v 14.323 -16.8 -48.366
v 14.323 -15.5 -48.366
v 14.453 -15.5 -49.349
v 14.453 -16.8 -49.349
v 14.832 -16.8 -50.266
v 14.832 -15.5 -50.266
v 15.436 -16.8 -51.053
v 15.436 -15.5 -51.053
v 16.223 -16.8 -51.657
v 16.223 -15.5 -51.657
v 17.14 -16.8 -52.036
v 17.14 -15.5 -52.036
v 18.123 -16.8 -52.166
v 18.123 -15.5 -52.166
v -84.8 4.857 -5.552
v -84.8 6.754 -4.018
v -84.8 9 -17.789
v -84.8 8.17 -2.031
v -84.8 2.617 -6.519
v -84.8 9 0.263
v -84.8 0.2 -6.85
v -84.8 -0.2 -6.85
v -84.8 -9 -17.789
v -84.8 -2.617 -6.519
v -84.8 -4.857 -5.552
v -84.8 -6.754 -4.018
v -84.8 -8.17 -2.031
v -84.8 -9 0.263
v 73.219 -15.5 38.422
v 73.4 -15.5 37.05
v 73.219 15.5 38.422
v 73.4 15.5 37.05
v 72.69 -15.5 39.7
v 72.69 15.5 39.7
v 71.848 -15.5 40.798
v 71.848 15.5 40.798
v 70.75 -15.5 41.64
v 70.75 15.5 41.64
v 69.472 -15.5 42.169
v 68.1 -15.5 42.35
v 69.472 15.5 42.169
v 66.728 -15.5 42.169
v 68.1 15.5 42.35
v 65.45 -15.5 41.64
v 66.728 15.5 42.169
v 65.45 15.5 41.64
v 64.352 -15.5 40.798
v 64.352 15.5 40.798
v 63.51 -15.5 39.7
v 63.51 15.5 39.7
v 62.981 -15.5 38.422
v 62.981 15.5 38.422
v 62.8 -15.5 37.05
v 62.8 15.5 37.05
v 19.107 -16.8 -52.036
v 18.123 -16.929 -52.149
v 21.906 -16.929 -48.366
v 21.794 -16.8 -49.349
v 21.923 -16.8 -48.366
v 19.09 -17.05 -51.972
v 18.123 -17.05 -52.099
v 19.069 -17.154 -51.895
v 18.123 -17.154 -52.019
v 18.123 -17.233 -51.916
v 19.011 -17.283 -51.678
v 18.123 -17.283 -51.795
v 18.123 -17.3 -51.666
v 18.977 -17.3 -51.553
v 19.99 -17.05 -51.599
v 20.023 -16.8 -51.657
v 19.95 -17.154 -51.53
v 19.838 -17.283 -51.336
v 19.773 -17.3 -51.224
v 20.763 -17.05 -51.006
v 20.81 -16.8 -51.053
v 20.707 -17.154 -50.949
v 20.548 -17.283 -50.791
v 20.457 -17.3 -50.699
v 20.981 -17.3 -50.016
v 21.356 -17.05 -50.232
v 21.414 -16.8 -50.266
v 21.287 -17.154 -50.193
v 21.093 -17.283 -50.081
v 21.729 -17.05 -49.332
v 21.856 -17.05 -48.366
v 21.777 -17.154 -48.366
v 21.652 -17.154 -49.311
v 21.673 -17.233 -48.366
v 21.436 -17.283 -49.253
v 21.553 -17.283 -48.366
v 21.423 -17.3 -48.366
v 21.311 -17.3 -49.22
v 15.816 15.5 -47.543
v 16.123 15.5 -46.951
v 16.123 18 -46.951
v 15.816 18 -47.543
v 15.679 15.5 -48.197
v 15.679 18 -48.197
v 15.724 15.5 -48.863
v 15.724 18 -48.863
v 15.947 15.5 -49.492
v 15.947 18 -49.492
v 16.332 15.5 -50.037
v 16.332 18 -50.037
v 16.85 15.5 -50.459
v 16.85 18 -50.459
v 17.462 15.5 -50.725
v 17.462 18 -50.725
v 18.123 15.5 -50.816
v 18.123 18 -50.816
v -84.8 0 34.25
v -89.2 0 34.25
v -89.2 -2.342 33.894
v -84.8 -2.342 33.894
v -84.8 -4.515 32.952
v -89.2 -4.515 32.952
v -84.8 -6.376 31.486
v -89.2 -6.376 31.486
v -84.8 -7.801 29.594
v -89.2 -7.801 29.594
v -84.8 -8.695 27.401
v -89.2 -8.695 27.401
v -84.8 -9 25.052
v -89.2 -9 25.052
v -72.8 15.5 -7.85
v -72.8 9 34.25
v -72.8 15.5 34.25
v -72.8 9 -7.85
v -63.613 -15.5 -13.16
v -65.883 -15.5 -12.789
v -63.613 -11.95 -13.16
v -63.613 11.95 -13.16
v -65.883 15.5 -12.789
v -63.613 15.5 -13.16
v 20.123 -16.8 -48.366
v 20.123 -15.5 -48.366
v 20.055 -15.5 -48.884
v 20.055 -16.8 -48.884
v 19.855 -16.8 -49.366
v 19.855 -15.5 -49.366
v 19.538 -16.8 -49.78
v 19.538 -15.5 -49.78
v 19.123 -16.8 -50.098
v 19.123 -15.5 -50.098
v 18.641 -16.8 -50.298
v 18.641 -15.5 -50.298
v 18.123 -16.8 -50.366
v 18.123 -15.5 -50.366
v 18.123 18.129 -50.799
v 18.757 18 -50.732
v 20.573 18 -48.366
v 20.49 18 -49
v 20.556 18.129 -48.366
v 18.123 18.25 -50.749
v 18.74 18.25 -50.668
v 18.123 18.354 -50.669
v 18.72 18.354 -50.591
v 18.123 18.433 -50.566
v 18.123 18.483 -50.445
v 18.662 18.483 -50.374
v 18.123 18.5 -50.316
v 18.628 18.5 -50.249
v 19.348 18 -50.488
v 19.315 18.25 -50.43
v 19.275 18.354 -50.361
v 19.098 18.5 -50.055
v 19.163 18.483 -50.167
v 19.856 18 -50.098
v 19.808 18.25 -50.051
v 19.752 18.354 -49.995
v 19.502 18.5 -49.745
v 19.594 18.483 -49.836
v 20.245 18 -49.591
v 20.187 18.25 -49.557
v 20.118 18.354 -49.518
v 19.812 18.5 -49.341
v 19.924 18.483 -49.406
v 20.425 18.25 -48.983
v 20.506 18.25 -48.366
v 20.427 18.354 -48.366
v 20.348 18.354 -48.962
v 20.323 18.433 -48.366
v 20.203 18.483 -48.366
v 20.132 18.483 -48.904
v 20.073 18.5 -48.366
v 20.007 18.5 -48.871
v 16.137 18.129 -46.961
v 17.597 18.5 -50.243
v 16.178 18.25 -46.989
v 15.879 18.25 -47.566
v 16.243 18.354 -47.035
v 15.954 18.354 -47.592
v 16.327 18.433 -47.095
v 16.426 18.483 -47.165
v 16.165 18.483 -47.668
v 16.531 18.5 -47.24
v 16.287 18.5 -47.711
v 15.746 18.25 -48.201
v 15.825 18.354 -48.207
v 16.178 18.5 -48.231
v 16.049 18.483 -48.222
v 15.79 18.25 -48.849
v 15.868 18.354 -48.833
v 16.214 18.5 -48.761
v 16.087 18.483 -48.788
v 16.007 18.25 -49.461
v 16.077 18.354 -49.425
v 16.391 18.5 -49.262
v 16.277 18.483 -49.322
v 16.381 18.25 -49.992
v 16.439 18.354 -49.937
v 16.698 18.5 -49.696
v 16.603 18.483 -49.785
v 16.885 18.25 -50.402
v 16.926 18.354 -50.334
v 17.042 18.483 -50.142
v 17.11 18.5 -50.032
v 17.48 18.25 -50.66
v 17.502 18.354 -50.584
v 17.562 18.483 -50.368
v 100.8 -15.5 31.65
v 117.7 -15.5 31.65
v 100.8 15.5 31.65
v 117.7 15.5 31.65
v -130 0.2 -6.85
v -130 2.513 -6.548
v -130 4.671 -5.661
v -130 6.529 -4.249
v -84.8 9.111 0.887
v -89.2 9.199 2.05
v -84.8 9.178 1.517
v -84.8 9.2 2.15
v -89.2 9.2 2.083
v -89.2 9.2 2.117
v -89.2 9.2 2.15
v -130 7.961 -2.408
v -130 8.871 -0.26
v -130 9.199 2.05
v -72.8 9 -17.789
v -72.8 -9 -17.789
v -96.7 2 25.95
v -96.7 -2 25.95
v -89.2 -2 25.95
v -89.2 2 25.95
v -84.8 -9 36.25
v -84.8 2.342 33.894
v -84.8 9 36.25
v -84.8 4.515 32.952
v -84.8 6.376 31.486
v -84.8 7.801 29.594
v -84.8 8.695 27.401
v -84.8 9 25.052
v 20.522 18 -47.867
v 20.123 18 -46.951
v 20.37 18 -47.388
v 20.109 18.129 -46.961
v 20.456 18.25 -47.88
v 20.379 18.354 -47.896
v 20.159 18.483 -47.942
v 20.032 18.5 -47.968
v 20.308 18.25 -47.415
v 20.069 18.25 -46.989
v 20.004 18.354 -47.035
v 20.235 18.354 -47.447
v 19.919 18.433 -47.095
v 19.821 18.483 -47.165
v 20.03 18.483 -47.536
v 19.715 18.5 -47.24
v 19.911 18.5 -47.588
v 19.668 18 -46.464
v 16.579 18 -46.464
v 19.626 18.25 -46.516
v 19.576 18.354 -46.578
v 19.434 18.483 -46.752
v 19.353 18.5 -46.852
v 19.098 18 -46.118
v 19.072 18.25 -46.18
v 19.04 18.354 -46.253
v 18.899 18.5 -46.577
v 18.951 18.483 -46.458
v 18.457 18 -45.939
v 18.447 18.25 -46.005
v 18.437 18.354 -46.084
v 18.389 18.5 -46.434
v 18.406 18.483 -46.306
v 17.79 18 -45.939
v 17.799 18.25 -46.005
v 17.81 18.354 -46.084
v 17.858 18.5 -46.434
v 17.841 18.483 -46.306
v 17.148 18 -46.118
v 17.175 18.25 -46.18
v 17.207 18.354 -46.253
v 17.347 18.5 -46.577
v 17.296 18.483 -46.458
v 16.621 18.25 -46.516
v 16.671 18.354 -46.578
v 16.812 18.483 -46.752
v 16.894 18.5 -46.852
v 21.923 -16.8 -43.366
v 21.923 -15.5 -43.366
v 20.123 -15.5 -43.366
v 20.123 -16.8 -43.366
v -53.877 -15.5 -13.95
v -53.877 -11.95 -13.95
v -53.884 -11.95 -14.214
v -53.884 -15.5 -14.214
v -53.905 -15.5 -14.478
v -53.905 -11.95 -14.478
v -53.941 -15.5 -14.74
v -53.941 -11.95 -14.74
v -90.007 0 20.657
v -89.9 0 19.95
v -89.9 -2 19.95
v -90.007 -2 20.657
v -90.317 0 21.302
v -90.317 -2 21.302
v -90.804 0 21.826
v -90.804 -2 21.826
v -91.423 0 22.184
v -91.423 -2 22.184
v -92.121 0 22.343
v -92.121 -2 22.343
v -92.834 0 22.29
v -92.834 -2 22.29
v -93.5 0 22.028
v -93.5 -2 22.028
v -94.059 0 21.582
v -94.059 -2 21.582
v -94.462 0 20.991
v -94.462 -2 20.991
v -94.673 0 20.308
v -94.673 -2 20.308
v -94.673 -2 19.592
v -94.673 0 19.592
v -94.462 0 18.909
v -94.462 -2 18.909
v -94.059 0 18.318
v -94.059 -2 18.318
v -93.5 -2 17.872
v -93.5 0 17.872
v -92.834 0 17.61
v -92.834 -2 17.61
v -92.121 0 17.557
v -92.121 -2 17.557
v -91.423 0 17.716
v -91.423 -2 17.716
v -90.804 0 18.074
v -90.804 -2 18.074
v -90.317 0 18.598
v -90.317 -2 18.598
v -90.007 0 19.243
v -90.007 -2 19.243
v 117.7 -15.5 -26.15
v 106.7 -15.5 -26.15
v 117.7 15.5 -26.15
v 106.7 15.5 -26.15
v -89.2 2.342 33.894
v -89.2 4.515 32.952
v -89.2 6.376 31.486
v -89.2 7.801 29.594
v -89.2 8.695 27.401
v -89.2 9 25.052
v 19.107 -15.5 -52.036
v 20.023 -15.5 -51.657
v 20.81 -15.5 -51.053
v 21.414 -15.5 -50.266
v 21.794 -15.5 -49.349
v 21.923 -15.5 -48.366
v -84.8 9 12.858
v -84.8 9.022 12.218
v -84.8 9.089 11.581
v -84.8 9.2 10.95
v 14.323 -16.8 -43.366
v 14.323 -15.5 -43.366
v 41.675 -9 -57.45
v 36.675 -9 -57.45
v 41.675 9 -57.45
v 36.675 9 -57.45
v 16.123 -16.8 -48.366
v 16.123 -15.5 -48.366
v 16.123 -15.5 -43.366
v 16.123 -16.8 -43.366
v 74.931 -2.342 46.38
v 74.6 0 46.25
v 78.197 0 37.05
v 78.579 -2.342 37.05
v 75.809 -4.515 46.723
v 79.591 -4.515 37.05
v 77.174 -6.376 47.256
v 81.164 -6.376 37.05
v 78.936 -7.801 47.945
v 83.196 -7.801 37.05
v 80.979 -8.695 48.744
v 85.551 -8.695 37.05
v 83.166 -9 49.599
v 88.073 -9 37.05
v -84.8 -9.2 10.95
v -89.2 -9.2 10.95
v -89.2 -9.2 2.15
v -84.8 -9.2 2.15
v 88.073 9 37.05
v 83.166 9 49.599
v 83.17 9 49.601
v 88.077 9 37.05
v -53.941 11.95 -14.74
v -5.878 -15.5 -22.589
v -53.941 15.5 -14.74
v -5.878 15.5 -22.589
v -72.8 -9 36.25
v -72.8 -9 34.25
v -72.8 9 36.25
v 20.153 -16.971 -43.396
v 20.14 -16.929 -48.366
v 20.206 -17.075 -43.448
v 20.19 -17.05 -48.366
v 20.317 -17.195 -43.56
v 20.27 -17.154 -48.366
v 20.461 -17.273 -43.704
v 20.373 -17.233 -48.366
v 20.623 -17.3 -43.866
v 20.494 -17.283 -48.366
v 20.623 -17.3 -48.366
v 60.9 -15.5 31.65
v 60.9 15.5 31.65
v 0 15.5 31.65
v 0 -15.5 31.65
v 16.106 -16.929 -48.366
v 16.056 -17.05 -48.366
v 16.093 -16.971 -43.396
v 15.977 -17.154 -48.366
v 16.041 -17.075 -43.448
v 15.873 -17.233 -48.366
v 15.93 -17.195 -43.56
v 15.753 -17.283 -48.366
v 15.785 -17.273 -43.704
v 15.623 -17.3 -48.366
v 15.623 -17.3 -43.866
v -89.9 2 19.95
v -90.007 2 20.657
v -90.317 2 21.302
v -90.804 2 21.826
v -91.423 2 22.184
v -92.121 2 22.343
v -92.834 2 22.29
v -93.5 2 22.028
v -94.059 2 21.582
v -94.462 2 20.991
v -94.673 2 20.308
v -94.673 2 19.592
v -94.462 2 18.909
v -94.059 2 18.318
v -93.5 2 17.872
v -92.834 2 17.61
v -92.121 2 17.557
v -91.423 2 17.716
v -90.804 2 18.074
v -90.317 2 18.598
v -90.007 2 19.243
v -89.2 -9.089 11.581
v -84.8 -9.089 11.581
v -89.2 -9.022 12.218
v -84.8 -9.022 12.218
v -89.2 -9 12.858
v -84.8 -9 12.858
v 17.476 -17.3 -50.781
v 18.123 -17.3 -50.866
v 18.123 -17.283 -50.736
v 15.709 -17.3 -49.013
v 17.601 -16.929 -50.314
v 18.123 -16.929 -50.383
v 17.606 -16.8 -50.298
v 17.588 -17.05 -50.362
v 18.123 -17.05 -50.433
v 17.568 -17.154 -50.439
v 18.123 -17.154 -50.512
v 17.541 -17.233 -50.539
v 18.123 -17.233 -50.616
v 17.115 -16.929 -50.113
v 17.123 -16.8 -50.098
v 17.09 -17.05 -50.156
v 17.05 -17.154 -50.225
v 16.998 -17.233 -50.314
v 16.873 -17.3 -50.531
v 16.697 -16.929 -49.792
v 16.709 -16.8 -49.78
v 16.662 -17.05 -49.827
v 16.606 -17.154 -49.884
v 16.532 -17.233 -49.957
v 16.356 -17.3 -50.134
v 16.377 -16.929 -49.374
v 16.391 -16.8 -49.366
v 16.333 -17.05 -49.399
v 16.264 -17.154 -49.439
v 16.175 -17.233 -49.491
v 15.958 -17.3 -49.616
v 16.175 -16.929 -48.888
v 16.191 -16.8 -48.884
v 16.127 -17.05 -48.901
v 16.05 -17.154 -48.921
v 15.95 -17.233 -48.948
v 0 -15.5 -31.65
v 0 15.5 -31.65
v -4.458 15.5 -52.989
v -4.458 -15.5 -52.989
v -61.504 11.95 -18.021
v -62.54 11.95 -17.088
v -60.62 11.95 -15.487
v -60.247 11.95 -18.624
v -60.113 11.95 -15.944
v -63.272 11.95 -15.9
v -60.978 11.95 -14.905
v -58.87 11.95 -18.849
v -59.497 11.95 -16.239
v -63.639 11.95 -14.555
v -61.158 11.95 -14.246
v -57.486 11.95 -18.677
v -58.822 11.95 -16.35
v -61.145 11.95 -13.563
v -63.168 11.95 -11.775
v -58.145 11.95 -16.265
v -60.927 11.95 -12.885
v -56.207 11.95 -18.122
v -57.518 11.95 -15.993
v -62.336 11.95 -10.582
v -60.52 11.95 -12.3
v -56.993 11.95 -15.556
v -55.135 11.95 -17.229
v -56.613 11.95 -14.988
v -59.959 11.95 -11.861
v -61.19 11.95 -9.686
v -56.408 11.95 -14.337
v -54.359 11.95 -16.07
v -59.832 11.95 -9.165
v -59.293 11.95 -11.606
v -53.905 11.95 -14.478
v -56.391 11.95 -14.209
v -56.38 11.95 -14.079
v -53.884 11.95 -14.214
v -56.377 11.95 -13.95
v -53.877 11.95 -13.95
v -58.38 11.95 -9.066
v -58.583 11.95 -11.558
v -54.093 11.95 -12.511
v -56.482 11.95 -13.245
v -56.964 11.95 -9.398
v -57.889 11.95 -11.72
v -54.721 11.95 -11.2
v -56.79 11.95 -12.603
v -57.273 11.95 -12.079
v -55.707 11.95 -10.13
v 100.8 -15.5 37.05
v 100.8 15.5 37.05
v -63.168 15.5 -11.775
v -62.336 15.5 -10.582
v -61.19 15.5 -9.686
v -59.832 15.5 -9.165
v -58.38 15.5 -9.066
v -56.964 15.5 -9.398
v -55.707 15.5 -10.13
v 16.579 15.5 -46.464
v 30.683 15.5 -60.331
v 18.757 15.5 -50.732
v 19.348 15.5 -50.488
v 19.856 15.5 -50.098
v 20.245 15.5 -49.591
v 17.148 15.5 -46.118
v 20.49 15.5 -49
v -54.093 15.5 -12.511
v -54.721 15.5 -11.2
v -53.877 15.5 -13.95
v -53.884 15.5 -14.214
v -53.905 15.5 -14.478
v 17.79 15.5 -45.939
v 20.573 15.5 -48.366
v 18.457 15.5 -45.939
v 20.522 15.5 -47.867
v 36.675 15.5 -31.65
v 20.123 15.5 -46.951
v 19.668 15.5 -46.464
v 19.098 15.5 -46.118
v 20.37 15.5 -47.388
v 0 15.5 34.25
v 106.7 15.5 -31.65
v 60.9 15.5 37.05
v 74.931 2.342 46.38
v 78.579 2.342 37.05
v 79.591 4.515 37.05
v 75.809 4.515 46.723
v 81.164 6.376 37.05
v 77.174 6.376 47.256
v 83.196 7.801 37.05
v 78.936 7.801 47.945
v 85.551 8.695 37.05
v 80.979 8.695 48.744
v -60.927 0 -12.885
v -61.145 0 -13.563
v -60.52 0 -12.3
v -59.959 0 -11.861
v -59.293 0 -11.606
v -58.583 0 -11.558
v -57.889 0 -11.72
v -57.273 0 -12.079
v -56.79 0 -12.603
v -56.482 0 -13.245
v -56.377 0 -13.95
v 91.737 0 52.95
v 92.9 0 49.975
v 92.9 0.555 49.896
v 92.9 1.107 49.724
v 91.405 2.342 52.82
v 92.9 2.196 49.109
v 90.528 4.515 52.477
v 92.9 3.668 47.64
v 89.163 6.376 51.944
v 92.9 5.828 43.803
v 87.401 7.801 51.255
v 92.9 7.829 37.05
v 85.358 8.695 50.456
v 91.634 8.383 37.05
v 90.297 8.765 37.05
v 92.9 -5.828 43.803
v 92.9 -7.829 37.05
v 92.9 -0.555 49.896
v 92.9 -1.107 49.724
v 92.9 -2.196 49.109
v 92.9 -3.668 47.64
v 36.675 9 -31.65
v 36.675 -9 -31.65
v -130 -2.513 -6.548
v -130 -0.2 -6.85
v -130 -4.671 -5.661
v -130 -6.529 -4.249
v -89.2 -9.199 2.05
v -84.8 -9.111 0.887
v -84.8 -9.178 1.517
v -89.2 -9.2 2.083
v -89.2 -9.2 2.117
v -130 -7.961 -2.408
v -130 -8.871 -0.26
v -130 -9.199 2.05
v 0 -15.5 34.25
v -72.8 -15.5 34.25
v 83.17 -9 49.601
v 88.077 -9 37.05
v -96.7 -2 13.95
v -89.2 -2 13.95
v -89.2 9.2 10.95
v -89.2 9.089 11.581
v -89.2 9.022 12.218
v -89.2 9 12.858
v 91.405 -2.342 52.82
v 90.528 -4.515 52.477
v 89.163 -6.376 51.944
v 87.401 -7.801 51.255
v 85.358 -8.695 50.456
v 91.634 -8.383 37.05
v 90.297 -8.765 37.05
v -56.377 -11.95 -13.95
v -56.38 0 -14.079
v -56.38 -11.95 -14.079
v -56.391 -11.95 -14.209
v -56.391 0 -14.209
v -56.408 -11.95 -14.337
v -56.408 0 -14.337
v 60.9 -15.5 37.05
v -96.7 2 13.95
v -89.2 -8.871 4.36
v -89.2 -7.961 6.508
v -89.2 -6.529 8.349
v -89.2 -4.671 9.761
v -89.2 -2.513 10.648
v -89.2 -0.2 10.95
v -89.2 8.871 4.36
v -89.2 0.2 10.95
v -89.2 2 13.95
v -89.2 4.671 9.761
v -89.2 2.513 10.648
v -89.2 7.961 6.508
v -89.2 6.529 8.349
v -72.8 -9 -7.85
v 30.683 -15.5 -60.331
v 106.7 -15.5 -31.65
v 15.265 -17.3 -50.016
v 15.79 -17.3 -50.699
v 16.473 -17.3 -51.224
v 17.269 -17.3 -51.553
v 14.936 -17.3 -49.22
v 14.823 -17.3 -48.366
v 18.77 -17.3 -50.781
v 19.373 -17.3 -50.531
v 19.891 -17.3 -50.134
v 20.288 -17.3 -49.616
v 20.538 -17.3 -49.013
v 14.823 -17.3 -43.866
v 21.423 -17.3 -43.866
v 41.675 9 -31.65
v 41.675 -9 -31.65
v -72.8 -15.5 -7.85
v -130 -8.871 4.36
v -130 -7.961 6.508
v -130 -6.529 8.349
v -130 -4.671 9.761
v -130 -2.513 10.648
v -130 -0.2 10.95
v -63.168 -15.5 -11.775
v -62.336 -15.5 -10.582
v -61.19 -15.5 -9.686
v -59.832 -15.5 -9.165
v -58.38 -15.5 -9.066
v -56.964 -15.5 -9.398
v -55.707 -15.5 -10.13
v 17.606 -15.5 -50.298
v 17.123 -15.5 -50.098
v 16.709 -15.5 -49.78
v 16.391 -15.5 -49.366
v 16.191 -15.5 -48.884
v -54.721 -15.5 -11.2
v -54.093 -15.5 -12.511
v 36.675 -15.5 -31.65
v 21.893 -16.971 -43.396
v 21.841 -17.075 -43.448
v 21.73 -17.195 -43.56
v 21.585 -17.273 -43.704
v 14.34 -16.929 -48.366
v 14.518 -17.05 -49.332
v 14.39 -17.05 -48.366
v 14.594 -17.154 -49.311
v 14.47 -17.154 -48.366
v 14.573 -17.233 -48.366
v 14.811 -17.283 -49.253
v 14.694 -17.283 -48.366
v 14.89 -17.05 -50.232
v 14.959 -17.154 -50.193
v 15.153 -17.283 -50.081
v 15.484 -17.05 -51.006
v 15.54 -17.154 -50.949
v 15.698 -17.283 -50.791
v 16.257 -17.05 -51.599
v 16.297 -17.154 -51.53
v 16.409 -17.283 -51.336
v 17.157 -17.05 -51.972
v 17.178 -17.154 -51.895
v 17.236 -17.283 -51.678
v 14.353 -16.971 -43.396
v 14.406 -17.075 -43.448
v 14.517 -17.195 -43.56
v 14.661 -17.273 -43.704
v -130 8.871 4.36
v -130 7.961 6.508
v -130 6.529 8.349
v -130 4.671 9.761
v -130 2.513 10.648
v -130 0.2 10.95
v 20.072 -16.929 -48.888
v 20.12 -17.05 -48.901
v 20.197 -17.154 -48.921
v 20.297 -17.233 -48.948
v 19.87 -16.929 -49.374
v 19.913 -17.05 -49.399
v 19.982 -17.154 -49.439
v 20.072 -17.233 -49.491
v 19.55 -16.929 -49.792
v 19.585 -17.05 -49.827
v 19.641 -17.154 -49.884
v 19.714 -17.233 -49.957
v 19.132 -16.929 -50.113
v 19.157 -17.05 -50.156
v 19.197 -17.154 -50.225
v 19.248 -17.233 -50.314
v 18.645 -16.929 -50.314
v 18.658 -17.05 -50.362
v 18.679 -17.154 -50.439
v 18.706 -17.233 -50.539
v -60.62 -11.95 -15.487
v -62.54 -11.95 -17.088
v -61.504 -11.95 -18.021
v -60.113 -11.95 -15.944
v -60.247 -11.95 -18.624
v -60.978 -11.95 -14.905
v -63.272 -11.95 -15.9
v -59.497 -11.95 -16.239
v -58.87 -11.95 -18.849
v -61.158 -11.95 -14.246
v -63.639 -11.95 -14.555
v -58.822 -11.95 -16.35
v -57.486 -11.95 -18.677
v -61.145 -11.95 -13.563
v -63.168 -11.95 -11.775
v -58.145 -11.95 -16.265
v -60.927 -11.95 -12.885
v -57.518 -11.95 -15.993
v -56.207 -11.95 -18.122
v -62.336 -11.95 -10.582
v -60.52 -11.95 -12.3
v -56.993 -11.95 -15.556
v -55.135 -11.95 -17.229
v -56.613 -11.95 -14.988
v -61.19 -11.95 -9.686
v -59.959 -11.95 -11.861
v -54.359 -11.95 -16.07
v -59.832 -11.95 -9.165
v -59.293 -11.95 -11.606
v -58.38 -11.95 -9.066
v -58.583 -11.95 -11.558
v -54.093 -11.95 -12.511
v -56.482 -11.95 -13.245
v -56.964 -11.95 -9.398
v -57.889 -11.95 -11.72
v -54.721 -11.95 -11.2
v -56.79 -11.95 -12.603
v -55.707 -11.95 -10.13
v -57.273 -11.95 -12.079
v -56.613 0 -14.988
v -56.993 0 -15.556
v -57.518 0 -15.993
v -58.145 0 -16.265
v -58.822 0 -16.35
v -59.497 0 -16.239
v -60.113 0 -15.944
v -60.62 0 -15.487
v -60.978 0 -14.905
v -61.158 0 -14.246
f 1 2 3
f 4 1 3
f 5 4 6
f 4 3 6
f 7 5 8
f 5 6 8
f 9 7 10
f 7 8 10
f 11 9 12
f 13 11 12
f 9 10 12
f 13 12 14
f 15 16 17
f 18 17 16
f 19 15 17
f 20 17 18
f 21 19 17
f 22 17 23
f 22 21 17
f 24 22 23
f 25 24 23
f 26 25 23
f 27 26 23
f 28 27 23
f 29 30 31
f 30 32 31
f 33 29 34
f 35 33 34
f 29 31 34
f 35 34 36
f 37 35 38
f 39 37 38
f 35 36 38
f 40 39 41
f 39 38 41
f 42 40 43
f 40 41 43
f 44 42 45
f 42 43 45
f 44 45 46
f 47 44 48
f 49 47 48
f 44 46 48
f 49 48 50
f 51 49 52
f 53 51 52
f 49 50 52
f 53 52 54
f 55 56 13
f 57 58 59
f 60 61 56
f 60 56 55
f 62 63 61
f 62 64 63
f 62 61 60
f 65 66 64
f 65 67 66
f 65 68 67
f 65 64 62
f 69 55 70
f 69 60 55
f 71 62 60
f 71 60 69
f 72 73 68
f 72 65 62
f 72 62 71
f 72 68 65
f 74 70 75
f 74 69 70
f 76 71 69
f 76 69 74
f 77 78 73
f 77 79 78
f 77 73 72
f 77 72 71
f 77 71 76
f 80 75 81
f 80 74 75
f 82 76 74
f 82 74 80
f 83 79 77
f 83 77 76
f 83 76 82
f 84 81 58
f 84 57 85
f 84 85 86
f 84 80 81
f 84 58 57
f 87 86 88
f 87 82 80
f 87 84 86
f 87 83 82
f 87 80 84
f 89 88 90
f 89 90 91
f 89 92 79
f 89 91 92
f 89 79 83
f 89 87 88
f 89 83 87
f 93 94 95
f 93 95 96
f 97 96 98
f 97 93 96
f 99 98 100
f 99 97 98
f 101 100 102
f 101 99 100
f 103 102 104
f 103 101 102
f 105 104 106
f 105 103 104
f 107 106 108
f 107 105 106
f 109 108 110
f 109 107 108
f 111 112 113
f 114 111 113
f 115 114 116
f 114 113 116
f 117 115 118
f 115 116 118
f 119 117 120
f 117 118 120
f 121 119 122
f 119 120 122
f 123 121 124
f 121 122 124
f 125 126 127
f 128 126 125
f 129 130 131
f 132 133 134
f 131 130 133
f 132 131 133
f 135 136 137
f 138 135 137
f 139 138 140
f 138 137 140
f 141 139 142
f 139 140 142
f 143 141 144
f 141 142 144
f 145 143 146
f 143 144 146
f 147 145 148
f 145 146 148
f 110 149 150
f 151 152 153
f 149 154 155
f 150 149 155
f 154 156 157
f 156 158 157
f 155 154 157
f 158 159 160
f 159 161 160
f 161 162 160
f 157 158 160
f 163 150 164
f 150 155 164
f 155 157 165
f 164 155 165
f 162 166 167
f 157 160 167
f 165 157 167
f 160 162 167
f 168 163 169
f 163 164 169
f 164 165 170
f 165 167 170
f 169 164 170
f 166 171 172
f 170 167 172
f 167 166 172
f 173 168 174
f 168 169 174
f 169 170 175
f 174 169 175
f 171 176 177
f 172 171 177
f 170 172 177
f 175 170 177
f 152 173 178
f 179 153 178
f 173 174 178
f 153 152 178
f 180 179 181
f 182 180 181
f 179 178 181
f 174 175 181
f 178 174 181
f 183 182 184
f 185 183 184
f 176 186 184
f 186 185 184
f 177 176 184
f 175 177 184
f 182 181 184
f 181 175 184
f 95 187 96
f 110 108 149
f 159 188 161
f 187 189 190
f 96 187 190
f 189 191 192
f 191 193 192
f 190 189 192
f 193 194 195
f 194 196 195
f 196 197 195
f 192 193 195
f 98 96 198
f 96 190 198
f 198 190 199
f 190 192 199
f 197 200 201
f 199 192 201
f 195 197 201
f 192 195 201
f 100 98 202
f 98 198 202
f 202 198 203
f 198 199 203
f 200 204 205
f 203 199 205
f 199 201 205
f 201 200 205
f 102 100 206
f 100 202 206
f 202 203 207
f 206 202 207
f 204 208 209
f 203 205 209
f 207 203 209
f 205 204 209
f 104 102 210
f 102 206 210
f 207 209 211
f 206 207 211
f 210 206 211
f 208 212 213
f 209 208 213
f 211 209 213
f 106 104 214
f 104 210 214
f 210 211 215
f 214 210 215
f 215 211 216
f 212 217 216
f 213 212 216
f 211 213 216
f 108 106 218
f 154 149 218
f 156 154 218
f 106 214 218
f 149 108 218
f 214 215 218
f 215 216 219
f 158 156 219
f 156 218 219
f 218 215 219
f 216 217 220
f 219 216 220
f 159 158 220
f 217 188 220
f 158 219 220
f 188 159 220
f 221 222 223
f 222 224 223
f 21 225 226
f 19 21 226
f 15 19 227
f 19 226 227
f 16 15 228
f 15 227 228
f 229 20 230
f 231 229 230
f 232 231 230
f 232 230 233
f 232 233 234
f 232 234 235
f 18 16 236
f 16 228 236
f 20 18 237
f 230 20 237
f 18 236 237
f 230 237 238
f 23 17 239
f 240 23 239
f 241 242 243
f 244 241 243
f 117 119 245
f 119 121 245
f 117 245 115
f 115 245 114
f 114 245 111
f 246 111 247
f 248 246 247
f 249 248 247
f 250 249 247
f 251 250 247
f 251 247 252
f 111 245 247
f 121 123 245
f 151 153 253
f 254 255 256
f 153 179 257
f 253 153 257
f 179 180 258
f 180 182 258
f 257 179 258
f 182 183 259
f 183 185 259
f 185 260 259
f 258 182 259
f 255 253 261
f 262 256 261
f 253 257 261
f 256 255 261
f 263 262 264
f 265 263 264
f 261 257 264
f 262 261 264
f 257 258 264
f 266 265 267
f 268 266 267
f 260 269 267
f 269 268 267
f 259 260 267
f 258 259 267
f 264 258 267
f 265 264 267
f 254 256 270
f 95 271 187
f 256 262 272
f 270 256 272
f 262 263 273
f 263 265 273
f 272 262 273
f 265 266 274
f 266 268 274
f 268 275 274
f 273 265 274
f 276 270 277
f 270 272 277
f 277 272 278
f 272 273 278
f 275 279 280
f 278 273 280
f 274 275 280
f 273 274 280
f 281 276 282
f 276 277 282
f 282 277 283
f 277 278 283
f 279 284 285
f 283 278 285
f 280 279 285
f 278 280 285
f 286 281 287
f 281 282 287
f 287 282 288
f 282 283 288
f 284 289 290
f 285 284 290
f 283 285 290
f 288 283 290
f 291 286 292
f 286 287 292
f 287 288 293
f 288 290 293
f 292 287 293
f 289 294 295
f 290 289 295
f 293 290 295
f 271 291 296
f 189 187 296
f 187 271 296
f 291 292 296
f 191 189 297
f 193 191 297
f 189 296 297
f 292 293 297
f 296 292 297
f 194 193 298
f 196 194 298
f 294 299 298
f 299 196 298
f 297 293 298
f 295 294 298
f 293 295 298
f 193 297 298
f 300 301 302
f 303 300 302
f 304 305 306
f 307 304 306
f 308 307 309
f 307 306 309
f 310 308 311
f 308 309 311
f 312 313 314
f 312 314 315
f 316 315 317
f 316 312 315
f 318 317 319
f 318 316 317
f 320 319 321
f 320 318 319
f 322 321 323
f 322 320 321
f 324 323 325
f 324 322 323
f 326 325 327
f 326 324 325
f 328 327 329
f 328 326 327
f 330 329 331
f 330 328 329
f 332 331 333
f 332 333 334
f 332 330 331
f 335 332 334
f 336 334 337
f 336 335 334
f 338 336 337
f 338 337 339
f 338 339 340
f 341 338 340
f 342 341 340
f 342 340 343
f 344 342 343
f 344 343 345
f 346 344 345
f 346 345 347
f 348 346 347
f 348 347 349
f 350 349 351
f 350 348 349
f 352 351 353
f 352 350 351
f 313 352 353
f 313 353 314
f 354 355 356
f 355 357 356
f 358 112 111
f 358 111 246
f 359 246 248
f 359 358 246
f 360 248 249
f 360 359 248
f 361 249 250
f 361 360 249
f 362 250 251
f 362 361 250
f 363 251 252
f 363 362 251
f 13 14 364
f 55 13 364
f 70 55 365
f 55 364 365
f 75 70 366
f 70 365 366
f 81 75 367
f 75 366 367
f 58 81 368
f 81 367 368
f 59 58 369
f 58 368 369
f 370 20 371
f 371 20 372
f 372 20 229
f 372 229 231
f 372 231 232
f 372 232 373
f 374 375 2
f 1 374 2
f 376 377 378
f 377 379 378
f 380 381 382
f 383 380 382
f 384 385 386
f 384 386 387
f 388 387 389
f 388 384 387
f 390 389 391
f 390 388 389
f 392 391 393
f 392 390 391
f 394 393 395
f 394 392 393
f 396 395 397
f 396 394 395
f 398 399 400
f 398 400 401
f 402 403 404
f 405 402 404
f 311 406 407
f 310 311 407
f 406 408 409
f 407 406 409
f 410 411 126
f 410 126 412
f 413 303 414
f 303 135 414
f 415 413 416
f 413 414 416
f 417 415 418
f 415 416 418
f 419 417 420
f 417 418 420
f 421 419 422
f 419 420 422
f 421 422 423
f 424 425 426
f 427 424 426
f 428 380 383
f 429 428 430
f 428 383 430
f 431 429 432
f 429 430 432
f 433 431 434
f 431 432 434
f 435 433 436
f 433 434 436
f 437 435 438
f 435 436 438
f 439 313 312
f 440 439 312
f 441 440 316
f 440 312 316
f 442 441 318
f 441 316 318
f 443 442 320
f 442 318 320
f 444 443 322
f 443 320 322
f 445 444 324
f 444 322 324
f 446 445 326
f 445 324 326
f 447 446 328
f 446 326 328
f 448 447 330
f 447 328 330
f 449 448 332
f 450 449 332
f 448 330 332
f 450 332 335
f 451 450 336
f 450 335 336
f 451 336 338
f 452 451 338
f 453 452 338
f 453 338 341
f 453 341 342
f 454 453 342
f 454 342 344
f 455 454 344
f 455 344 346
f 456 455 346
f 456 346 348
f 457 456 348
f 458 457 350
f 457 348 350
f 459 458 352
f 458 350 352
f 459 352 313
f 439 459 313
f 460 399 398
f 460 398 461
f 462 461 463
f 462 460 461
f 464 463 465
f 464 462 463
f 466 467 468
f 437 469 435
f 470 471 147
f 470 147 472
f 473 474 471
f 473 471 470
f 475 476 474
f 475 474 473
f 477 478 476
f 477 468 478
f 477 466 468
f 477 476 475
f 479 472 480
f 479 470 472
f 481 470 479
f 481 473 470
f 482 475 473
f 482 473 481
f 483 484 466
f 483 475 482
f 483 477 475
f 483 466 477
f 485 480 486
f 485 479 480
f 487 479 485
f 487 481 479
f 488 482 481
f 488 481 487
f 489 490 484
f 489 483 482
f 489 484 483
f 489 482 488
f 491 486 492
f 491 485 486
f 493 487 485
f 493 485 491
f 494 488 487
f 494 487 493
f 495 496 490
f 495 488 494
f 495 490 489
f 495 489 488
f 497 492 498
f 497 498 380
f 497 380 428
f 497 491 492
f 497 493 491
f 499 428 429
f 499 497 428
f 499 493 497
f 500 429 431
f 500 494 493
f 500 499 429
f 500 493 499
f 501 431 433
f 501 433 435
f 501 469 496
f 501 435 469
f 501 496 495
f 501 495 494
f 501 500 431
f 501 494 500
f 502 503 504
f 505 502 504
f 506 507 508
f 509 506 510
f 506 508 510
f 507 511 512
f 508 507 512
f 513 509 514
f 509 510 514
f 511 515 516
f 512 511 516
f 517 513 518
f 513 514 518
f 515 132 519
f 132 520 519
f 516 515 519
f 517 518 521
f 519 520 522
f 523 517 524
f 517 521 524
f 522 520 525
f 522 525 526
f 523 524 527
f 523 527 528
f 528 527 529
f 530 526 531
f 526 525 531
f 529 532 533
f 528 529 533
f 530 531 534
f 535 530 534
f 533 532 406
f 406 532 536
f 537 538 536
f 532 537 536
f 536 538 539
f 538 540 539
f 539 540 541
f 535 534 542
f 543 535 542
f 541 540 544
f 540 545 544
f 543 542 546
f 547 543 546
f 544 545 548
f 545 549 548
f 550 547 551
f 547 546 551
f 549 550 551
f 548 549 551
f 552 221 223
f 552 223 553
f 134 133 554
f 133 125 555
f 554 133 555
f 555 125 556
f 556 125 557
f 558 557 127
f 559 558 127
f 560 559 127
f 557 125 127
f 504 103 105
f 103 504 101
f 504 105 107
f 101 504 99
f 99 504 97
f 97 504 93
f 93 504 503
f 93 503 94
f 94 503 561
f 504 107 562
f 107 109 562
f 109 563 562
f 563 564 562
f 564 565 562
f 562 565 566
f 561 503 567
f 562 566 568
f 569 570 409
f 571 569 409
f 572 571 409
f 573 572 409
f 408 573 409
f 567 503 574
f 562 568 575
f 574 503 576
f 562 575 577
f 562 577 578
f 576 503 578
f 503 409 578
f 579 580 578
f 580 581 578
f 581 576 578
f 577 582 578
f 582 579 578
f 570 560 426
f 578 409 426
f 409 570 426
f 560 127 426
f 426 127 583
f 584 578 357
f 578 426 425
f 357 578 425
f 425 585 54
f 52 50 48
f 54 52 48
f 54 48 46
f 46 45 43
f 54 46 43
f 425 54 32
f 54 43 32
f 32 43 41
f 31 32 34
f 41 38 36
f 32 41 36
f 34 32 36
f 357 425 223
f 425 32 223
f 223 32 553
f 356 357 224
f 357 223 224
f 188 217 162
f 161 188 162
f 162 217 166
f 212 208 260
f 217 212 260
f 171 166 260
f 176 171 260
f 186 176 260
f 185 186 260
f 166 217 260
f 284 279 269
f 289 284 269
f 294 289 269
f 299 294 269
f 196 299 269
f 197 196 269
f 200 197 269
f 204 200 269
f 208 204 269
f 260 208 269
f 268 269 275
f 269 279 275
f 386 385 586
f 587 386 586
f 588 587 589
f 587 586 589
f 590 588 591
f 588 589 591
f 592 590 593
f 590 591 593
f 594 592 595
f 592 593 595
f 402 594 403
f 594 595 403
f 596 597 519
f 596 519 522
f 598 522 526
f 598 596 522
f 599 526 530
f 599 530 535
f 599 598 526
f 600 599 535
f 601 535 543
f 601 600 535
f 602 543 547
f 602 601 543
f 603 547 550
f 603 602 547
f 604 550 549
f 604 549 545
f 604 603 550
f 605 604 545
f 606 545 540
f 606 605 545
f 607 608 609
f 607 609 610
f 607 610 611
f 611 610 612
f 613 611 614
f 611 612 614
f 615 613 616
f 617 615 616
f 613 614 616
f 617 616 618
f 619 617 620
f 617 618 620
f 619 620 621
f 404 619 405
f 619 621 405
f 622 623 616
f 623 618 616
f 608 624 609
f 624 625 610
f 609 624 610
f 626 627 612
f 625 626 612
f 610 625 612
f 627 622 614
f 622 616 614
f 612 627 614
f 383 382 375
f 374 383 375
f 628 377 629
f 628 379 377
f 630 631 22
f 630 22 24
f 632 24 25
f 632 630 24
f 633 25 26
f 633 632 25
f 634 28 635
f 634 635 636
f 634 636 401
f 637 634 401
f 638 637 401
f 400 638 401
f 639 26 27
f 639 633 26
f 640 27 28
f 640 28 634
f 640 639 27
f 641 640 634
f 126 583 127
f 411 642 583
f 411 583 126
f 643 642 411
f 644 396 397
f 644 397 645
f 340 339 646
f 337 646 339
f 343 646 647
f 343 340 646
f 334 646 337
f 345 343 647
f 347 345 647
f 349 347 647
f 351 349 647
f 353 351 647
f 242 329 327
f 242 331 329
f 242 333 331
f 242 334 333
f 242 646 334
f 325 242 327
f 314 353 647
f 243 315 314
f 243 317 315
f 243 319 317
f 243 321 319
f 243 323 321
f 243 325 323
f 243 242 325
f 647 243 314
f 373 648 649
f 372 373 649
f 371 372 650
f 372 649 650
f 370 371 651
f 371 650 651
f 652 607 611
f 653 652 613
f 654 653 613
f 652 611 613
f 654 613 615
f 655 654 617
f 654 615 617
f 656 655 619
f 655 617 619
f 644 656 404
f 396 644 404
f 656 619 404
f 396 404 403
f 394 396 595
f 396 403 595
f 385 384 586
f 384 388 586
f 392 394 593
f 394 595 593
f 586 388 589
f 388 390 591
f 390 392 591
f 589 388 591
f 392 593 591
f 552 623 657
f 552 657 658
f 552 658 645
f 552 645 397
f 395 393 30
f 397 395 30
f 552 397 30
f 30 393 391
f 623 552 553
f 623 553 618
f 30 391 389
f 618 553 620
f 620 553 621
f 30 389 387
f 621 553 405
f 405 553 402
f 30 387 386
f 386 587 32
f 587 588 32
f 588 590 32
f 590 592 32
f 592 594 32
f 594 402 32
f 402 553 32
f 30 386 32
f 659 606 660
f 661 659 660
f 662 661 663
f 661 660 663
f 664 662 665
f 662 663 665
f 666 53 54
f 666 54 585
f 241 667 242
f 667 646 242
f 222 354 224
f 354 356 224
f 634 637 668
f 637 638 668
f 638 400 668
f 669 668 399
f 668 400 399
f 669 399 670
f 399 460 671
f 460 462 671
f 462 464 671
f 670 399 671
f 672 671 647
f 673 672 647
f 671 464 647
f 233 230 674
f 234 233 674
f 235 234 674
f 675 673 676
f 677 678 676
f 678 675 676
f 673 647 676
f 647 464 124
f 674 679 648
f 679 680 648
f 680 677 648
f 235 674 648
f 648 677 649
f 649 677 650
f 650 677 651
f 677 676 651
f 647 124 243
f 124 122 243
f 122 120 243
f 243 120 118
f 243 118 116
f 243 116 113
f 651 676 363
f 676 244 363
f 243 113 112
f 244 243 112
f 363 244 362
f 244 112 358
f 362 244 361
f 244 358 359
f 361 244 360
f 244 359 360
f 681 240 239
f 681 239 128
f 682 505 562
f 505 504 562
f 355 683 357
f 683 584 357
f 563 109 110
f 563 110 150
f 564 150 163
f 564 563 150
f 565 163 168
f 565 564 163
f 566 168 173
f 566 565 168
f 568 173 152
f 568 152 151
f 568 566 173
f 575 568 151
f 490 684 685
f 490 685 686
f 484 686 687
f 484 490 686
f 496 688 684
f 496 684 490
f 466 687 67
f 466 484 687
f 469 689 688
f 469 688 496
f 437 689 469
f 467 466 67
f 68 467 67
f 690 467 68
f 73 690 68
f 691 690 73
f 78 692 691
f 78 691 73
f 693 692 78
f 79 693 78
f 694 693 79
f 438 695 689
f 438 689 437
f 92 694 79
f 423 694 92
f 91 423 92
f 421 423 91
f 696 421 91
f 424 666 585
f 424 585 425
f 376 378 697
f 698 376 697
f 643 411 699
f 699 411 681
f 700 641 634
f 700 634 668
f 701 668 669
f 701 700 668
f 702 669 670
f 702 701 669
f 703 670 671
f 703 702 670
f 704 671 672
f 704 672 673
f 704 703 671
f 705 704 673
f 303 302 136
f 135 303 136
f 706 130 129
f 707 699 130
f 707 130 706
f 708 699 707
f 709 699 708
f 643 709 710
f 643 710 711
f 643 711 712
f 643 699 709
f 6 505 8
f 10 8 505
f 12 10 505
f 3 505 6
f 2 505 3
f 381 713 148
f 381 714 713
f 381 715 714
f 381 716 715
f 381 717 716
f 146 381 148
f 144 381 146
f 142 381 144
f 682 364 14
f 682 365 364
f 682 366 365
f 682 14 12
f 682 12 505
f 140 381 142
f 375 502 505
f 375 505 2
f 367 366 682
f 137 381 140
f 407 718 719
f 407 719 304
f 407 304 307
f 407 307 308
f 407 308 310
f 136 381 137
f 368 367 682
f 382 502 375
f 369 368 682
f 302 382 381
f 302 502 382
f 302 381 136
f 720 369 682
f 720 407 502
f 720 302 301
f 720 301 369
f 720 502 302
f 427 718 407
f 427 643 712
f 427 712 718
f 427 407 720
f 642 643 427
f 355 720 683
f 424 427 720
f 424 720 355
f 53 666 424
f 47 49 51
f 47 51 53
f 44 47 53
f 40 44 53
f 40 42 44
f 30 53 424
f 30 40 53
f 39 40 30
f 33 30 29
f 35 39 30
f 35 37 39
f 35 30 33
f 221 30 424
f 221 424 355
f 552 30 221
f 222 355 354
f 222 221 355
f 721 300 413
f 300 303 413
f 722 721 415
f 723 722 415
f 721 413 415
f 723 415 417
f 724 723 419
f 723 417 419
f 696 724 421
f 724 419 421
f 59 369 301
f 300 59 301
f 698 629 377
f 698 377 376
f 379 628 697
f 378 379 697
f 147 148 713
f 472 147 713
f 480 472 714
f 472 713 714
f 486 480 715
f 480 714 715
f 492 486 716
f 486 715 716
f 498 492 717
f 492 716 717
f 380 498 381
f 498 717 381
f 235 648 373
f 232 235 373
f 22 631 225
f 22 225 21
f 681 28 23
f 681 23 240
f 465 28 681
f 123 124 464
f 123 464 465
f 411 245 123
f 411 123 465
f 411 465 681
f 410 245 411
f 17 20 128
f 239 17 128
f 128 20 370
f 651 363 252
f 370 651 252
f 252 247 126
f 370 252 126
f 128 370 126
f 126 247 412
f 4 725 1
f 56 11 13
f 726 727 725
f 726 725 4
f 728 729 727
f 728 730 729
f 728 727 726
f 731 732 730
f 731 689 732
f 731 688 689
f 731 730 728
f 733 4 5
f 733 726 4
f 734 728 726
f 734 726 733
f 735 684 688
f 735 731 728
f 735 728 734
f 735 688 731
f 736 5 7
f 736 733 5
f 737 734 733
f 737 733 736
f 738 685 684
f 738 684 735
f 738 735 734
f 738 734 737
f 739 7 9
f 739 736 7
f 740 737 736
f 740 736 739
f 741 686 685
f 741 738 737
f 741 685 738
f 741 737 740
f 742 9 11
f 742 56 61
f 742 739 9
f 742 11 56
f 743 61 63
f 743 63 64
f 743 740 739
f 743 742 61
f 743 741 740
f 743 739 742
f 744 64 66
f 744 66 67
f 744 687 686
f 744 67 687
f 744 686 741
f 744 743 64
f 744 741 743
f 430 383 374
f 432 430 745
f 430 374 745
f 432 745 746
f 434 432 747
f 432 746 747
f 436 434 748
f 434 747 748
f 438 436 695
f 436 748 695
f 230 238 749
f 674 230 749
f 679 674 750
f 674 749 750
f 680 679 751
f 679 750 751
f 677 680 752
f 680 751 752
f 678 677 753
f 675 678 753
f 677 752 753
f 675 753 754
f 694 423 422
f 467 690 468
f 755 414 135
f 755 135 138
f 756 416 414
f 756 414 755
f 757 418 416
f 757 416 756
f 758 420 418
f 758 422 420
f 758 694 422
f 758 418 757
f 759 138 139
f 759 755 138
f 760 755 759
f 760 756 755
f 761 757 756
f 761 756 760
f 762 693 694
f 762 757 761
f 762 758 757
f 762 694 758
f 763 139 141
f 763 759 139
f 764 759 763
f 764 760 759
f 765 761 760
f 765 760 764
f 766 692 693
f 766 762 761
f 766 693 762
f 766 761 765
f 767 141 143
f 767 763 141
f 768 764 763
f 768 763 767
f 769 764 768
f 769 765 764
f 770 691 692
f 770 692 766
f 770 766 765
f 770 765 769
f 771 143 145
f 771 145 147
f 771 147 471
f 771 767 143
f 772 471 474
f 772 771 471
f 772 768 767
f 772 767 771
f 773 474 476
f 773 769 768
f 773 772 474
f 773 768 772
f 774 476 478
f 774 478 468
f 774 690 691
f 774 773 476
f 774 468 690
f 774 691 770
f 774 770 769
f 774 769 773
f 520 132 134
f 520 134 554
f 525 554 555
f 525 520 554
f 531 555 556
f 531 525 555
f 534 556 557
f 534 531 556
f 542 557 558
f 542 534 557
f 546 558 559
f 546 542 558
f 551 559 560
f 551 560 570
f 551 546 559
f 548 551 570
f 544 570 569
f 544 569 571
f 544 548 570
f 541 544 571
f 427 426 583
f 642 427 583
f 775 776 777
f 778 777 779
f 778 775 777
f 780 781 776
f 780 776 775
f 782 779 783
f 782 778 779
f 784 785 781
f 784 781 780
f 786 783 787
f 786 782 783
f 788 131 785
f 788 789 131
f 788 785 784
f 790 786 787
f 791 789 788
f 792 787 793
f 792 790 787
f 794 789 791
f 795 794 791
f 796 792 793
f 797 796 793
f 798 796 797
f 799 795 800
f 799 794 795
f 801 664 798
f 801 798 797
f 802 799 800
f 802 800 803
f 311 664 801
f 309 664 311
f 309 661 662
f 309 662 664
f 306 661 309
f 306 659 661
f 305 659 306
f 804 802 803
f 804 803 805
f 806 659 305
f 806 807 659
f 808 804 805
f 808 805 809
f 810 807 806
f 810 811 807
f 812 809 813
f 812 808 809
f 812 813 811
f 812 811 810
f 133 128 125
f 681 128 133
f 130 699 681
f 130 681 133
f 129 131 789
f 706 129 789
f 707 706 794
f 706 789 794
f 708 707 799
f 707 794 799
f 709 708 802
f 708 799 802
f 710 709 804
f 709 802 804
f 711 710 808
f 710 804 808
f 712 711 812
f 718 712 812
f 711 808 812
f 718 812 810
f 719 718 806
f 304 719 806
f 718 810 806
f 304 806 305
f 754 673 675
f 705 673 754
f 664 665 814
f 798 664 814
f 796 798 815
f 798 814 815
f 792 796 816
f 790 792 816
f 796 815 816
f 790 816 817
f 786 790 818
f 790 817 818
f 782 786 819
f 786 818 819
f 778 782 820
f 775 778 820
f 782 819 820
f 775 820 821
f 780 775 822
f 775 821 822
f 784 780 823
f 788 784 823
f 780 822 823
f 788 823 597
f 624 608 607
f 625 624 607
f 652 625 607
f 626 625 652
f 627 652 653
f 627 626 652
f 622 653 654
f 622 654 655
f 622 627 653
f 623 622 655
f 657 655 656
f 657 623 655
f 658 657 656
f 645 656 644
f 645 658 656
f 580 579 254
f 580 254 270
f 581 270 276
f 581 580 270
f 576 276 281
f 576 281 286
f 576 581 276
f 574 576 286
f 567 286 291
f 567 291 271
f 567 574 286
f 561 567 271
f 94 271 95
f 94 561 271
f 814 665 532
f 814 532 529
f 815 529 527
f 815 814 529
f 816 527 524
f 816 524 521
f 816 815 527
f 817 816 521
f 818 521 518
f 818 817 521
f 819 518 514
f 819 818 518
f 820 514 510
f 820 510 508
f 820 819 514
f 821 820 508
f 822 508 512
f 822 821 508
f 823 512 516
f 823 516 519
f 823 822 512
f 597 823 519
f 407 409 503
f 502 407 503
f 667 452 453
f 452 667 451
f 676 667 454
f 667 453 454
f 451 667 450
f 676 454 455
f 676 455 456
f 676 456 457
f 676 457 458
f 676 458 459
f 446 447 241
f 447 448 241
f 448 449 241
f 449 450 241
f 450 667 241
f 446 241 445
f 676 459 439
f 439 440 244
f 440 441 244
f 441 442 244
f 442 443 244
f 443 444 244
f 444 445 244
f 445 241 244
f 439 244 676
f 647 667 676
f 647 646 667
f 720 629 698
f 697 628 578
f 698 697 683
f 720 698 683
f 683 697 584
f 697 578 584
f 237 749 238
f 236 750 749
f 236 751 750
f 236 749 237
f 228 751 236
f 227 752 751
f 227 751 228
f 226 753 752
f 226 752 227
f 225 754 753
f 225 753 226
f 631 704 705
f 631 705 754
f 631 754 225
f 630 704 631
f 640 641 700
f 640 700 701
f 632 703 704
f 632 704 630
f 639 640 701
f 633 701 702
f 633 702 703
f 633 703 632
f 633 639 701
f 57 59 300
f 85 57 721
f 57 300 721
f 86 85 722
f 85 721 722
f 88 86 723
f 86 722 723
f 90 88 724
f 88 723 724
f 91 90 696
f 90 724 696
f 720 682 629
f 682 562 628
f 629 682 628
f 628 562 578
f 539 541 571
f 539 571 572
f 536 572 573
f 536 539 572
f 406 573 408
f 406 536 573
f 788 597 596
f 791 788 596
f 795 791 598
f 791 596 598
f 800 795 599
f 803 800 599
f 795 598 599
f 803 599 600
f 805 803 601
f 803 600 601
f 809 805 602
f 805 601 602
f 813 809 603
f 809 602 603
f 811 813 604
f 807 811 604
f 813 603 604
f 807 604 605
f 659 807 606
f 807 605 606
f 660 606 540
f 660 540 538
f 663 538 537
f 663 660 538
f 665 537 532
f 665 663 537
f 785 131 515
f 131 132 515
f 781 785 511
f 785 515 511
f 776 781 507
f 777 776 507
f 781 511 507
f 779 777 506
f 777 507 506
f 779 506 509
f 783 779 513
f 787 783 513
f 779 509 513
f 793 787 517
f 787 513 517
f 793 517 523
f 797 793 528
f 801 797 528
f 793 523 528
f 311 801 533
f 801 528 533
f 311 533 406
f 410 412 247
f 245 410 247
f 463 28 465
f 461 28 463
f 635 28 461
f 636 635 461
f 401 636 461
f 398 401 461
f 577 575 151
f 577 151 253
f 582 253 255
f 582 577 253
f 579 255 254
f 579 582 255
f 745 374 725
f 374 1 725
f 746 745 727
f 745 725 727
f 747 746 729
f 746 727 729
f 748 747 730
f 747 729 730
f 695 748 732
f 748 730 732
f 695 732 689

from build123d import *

# Parameters (mm, degrees)
F0_W        = 11
F0_H        = 57.8
F1_DEPTH    = 15.5
F2_DEPTH    = 9.2
F3_DEPTH    = 9
F0_W_2      = 7.5
F0_H_2      = 12
F0_R        = 2.4
F4_DEPTH    = 2
F0_W_3      = 5
F0_H_3      = 25.8
F5_DEPTH    = 9
F6_DEPTH    = 11.95
F7_T4_DEPTH = 55.8672846567
F7_T9_DEPTH = 65.2797771826
F8_T1_DEPTH = 4.4
F8_T3_DEPTH = 27.3945645751
F9_T1_DEPTH = 67.7
F9_T3_DEPTH = 63.3
F12_DEPTH   = 1.8
F13_DEPTH   = 34
F14_R       = 0.5
F15_R       = 0.5


# Not quite as in the source:
# - a fillet or chamfer that OpenCascade refuses, or shapes differently, is made with other operations: its cross-section is extruded or revolved along the edge and cut away or added


with BuildPart() as f1:
    # F0 (on Front) → F1 (new body)
    with BuildSketch(Plane.XZ):
        Polygon((36.6750596455, -31.65), (0, -31.65), (-4.4580704593, -52.9892972654), (30.6832493492, -60.3307986181), align=None)
        with BuildLine():
            Line((0, -31.65), (0, 31.65))
            Line((0, 31.65), (0, 34.25))
            Line((0, 34.25), (-72.8, 34.25))
            Line((-72.8, 34.25), (-72.8, -7.85))
            Line((-72.8, -7.85), (-65.8825243602, -12.7894868936))
            Line((-65.8825243602, -12.7894868936), (-63.6125976921, -13.1602063582))
            ThreePointArc((-63.6125976921, -13.1602063582), (-58.3804729246, -9.066043583), (-53.8766669643, -13.95))
            ThreePointArc((-53.8766669643, -13.95), (-53.8927105474, -14.3461940397), (-53.9407362366, -14.7397936418))
            Line((-53.9407362366, -14.7397936418), (-5.8775063509, -22.5893753474))
            Line((-5.8775063509, -22.5893753474), (0, -31.65))
        make_face()
        Polygon((60.9, 31.65), (0, 31.65), (0, -31.65), (36.6750596455, -31.65), (41.6750596455, -31.65), (106.7, -31.65), (106.7, -26.15), (106.7, 31.65), (100.8, 31.65), align=None)
        with Locations((112.2, 2.75)):
            Rectangle(F0_W, F0_H)
        with BuildLine():
            Line((60.9, 37.05), (60.9, 31.65))
            Line((60.9, 31.65), (100.8, 31.65))
            Line((100.8, 31.65), (100.8, 37.05))
            Line((100.8, 37.05), (92.9, 37.05))
            Line((92.9, 37.05), (78.1969370594, 37.05))
            Line((78.1969370594, 37.05), (73.4, 37.05))
            ThreePointArc((73.4, 37.05), (68.1, 31.75), (62.8, 37.05))
            Line((62.8, 37.05), (60.9, 37.05))
        make_face()
        with BuildLine():
            Line((68.1, 42.35), (68.1, 37.05))
            Line((68.1, 37.05), (73.4, 37.05))
            ThreePointArc((73.4, 37.05), (71.8476659403, 40.7976659403), (68.1, 42.35))
        make_face()
        with BuildLine():
            ThreePointArc((68.1, 42.35), (64.3523340597, 40.7976659403), (62.8, 37.05))
            Line((62.8, 37.05), (68.1, 37.05))
            Line((68.1, 37.05), (68.1, 42.35))
        make_face()
        with BuildLine():
            Line((68.1, 37.05), (62.8, 37.05))
            ThreePointArc((62.8, 37.05), (68.1, 31.75), (73.4, 37.05))
            Line((73.4, 37.05), (68.1, 37.05))
        make_face()
    extrude(amount=F1_DEPTH)



with BuildPart() as f2:
    # F0 (on Front) → F2 (new body)
    with BuildSketch(Plane.XZ):
        Polygon((-130, -6.85), (-84.8, -6.85), (-84.8, 10.95), (-89.2, 10.95), (-130, 10.95), align=None)
    extrude(amount=F2_DEPTH)


with BuildPart() as f1_1:
    add(f1.part)

    add(f2.part)  # F3 merges F2
    # F0 (on Front) → F3 (join)
    with BuildSketch(Plane.XZ):
        Polygon((-72.8, -7.85), (-72.8, 34.25), (-72.8, 36.25), (-84.8, 36.25), (-84.8, 34.25), (-84.8, 10.95), (-84.8, -6.85), (-84.8, -17.7894868936), (-72.8, -17.7894868936), align=None)
        Polygon((-84.8, 10.95), (-84.8, 34.25), (-89.2, 34.25), (-89.2, 25.95), (-89.2, 13.95), (-89.2, 10.95), align=None)
        Polygon((78.1969370594, 37.05), (92.9, 37.05), (92.9, 49.9748528671), (91.7368025022, 52.95), (74.6, 46.25), align=None)
    extrude(amount=F3_DEPTH)

    # F0 (on Front) → F4 (join)
    with BuildSketch(Plane.XZ):
        with Locations((-92.95, 19.95)):
            Rectangle(F0_W_2, F0_H_2)
        with Locations((-92.3, 19.95)):
            Circle(F0_R, mode=Mode.SUBTRACT)
    extrude(amount=F4_DEPTH)

    # F0 (on Front) → F5 (join)
    with BuildSketch(Plane.XZ):
        with Locations((39.1750596455, -44.55)):
            Rectangle(F0_W_3, F0_H_3)
    extrude(amount=F5_DEPTH)

    # F0 (on Front) → F6 (join)
    with BuildSketch(Plane.XZ):
        with BuildLine():
            ThreePointArc((-63.6125976921, -13.1602063582), (-59.5664606062, -18.7859307277), (-53.9407362366, -14.7397936418))
            Line((-53.9407362366, -14.7397936418), (-56.4080478324, -14.3368377021))
            ThreePointArc((-56.4080478324, -14.3368377021), (-59.1635046665, -16.3186191319), (-61.1452860963, -13.5631622979))
            Line((-61.1452860963, -13.5631622979), (-63.6125976921, -13.1602063582))
        make_face()
        with BuildLine():
            Line((-56.4080478324, -14.3368377021), (-53.9407362366, -14.7397936418))
            ThreePointArc((-53.9407362366, -14.7397936418), (-53.8927105474, -14.3461940397), (-53.8766669643, -13.95))
            ThreePointArc((-53.8766669643, -13.95), (-58.3804729246, -9.066043583), (-63.6125976921, -13.1602063582))
            Line((-63.6125976921, -13.1602063582), (-61.1452860963, -13.5631622979))
            ThreePointArc((-61.1452860963, -13.5631622979), (-58.5826127408, -11.5578580815), (-56.3766669643, -13.95))
            ThreePointArc((-56.3766669643, -13.95), (-56.3845250458, -14.1440542235), (-56.4080478324, -14.3368377021))
        make_face()
    extrude(amount=F6_DEPTH)

    # F7: fillet of radius 9.2 on 2 edges, made by hand


with BuildPart() as f7_tool2:
    # F7_s3 → F7_t4 (new body)
    with BuildSketch(Plane(origin=(-14.1665955701, 0, 36.2343508079), x_dir=(0, 1, 0), z_dir=(0.3641304348, 0, -0.9313479621))):
        with BuildLine():
            ThreePointArc((0, 86.3195905796), (-6.3757128891, 89.0831332328), (-9, 95.5174164097))
            Line((-9, 95.5174164097), (-9, 86.3195905796))
            Line((-9, 86.3195905796), (0, 86.3195905796))
        make_face()
    extrude(amount=F7_T4_DEPTH)

    split(bisect_by=Plane.XY.offset(37.05), keep=Keep.TOP)


with BuildPart() as f1_2:
    add(f1_1.part)

    # F7_t1: cut F7_tool2
    add(f7_tool2.part, mode=Mode.SUBTRACT)


with BuildPart() as f7_tool7:
    # F7_s8 → F7_t9 (new body)
    with BuildSketch(Plane(origin=(9.603758078, 0, -24.563836636), x_dir=(0, 1, 0), z_dir=(-0.3641304348, 0, 0.9313479621))):
        with BuildLine():
            ThreePointArc((0, -104.7195905796), (-6.3757128891, -101.9560479264), (-9, -95.5217647496))
            Line((-9, -95.5217647496), (-9, -104.7195905796))
            Line((-9, -104.7195905796), (0, -104.7195905796))
        make_face()
    extrude(amount=F7_T9_DEPTH)

    split(bisect_by=Plane.XY.offset(37.05), keep=Keep.TOP)


with BuildPart() as f1_3:
    add(f1_2.part)

    # F7_t6: cut F7_tool7
    add(f7_tool7.part, mode=Mode.SUBTRACT)

    # F8: fillet of radius 9.2 on 2 edges, made by hand

    # F8_s2 → F8_t1 (join)
    with BuildSketch(Plane.YZ.offset(-89.2)):
        with BuildLine():
            ThreePointArc((-9.2, 10.95), (-9.050136613, 11.8987120982), (-9, 12.8578784028))
            Line((-9, 12.8578784028), (-9, 10.95))
            Line((-9, 10.95), (-9.2, 10.95))
        make_face()
    extrude(amount=F8_T1_DEPTH)

    # F8_s4 → F8_t3 (cut)
    with BuildSketch(Plane.YZ.offset(-112.1945645751)):
        with BuildLine():
            ThreePointArc((0, 34.25), (-6.3757128891, 31.4864573468), (-9, 25.0521741699))
            Line((-9, 25.0521741699), (-9, 34.25))
            Line((-9, 34.25), (0, 34.25))
        make_face()
    extrude(amount=F8_T3_DEPTH, mode=Mode.SUBTRACT)

    # F9: fillet of radius 9 on 2 edges, made by hand

    # F9_s2 → F9_t1 (cut)
    with BuildSketch(Plane.YZ.offset(-152.5)):
        with BuildLine():
            ThreePointArc((-0.2, -6.85), (-6.5639610307, -4.2139610307), (-9.2, 2.15))
            Line((-9.2, 2.15), (-9.2, -6.85))
            Line((-9.2, -6.85), (-0.2, -6.85))
        make_face()
    extrude(amount=F9_T1_DEPTH, mode=Mode.SUBTRACT)

    # F9_s4 → F9_t3 (cut)
    with BuildSketch(Plane.YZ.offset(-152.5)):
        with BuildLine():
            ThreePointArc((-9.2, 1.95), (-6.5639610307, 8.3139610307), (-0.2, 10.95))
            Line((-0.2, 10.95), (-9.2, 10.95))
            Line((-9.2, 10.95), (-9.2, 1.95))
        make_face()
    extrude(amount=F9_T3_DEPTH, mode=Mode.SUBTRACT)

    # F10: F1 across plane


with BuildPart() as f1_4:
    add(f1_3.part)
    add(f1_3.part.mirror(Plane.XZ))

    # F11 (on face) → F12 (join)
    with BuildSketch(Plane.XZ.offset(15.5)):
        with BuildLine():
            ThreePointArc((14.3233330357, -48.3658756971), (14.8036945011, -46.5165514962), (16.1233330357, -45.1347768128))
            Line((16.1233330357, -45.1347768128), (16.1233330357, -43.3658756971))
            Line((16.1233330357, -43.3658756971), (14.3233330357, -43.3658756971))
            Line((14.3233330357, -43.3658756971), (14.3233330357, -48.3658756971))
        make_face()
        with BuildLine():
            Line((18.1233330357, -52.1658756971), (18.1233330357, -50.8158756971))
            ThreePointArc((18.1233330357, -50.8158756971), (15.9473863376, -49.4918223952), (16.1233330357, -46.9507785273))
            Line((16.1233330357, -46.9507785273), (16.1233330357, -45.1347768128))
            ThreePointArc((16.1233330357, -45.1347768128), (14.8036945011, -46.5165514962), (14.3233330357, -48.3658756971))
            ThreePointArc((14.3233330357, -48.3658756971), (15.4363272672, -51.0528814656), (18.1233330357, -52.1658756971))
        make_face()
        with BuildLine():
            ThreePointArc((16.1233330357, -46.9507785273), (15.9473863376, -49.4918223952), (18.1233330357, -50.8158756971))
            Line((18.1233330357, -50.8158756971), (18.1233330357, -50.3658756971))
            ThreePointArc((18.1233330357, -50.3658756971), (16.7091194733, -49.7800892595), (16.1233330357, -48.3658756971))
            Line((16.1233330357, -48.3658756971), (16.1233330357, -46.9507785273))
        make_face()
        with BuildLine():
            ThreePointArc((18.1233330357, -50.8158756971), (19.8557446496, -50.098287311), (20.5733330357, -48.3658756971))
            ThreePointArc((20.5733330357, -48.3658756971), (20.4581242469, -47.6234135769), (20.1233330357, -46.9507785273))
            Line((20.1233330357, -46.9507785273), (20.1233330357, -48.3658756971))
            ThreePointArc((20.1233330357, -48.3658756971), (19.537546598, -49.7800892595), (18.1233330357, -50.3658756971))
            Line((18.1233330357, -50.3658756971), (18.1233330357, -50.8158756971))
        make_face()
        with BuildLine():
            ThreePointArc((20.1233330357, -46.9507785273), (20.4581242469, -47.6234135769), (20.5733330357, -48.3658756971))
            ThreePointArc((20.5733330357, -48.3658756971), (19.8557446496, -50.098287311), (18.1233330357, -50.8158756971))
            Line((18.1233330357, -50.8158756971), (18.1233330357, -52.1658756971))
            ThreePointArc((18.1233330357, -52.1658756971), (20.8103388042, -51.0528814656), (21.9233330357, -48.3658756971))
            ThreePointArc((21.9233330357, -48.3658756971), (21.4429715702, -46.5165514962), (20.1233330357, -45.1347768128))
            Line((20.1233330357, -45.1347768128), (20.1233330357, -46.9507785273))
        make_face()
        with BuildLine():
            Line((20.1233330357, -43.3658756971), (20.1233330357, -45.1347768128))
            ThreePointArc((20.1233330357, -45.1347768128), (21.4429715702, -46.5165514962), (21.9233330357, -48.3658756971))
            Line((21.9233330357, -48.3658756971), (21.9233330357, -43.3658756971))
            Line((21.9233330357, -43.3658756971), (20.1233330357, -43.3658756971))
        make_face()
    extrude(amount=F12_DEPTH)

    # F11 (on face) → F13 (join)
    with BuildSketch(Plane.XZ.offset(15.5)):
        with BuildLine():
            ThreePointArc((16.1233330357, -46.9507785273), (15.9473863376, -49.4918223952), (18.1233330357, -50.8158756971))
            Line((18.1233330357, -50.8158756971), (18.1233330357, -50.3658756971))
            ThreePointArc((18.1233330357, -50.3658756971), (16.7091194733, -49.7800892595), (16.1233330357, -48.3658756971))
            Line((16.1233330357, -48.3658756971), (16.1233330357, -46.9507785273))
        make_face()
        with BuildLine():
            Line((20.1233330357, -48.3658756971), (20.1233330357, -46.9507785273))
            ThreePointArc((20.1233330357, -46.9507785273), (18.1233330357, -45.9158756971), (16.1233330357, -46.9507785273))
            Line((16.1233330357, -46.9507785273), (16.1233330357, -48.3658756971))
            ThreePointArc((16.1233330357, -48.3658756971), (18.1233330357, -46.3658756971), (20.1233330357, -48.3658756971))
        make_face()
        with BuildLine():
            ThreePointArc((18.1233330357, -50.8158756971), (19.8557446496, -50.098287311), (20.5733330357, -48.3658756971))
            ThreePointArc((20.5733330357, -48.3658756971), (20.4581242469, -47.6234135769), (20.1233330357, -46.9507785273))
            Line((20.1233330357, -46.9507785273), (20.1233330357, -48.3658756971))
            ThreePointArc((20.1233330357, -48.3658756971), (19.537546598, -49.7800892595), (18.1233330357, -50.3658756971))
            Line((18.1233330357, -50.3658756971), (18.1233330357, -50.8158756971))
        make_face()
        with BuildLine():
            ThreePointArc((18.1233330357, -50.3658756971), (19.537546598, -49.7800892595), (20.1233330357, -48.3658756971))
            ThreePointArc((20.1233330357, -48.3658756971), (18.1233330357, -46.3658756971), (16.1233330357, -48.3658756971))
            ThreePointArc((16.1233330357, -48.3658756971), (16.7091194733, -49.7800892595), (18.1233330357, -50.3658756971))
        make_face()
    extrude(amount=-F13_DEPTH)

    # F14
    f14_edges = [f1_4.edges().sort_by_distance(p)[0] for p in [
        (18.123333, 18.5, -45.915876),
    ]]
    fillet(f14_edges, radius=F14_R)

    # F15
    f15_edges = [f1_4.edges().sort_by_distance(p)[0] for p in [
        (14.323333, -17.3, -45.865876),
        (18.123333, -17.3, -52.165876),
        (16.123333, -17.3, -45.865876),
        (21.023333, -17.3, -43.365876),
        (15.223333, -17.3, -43.365876),
        (21.923333, -17.3, -45.865876),
        (20.123333, -17.3, -45.865876),
        (18.123333, -17.3, -50.365876),
    ]]
    fillet(f15_edges, radius=F15_R)


solid = f1_4.part
